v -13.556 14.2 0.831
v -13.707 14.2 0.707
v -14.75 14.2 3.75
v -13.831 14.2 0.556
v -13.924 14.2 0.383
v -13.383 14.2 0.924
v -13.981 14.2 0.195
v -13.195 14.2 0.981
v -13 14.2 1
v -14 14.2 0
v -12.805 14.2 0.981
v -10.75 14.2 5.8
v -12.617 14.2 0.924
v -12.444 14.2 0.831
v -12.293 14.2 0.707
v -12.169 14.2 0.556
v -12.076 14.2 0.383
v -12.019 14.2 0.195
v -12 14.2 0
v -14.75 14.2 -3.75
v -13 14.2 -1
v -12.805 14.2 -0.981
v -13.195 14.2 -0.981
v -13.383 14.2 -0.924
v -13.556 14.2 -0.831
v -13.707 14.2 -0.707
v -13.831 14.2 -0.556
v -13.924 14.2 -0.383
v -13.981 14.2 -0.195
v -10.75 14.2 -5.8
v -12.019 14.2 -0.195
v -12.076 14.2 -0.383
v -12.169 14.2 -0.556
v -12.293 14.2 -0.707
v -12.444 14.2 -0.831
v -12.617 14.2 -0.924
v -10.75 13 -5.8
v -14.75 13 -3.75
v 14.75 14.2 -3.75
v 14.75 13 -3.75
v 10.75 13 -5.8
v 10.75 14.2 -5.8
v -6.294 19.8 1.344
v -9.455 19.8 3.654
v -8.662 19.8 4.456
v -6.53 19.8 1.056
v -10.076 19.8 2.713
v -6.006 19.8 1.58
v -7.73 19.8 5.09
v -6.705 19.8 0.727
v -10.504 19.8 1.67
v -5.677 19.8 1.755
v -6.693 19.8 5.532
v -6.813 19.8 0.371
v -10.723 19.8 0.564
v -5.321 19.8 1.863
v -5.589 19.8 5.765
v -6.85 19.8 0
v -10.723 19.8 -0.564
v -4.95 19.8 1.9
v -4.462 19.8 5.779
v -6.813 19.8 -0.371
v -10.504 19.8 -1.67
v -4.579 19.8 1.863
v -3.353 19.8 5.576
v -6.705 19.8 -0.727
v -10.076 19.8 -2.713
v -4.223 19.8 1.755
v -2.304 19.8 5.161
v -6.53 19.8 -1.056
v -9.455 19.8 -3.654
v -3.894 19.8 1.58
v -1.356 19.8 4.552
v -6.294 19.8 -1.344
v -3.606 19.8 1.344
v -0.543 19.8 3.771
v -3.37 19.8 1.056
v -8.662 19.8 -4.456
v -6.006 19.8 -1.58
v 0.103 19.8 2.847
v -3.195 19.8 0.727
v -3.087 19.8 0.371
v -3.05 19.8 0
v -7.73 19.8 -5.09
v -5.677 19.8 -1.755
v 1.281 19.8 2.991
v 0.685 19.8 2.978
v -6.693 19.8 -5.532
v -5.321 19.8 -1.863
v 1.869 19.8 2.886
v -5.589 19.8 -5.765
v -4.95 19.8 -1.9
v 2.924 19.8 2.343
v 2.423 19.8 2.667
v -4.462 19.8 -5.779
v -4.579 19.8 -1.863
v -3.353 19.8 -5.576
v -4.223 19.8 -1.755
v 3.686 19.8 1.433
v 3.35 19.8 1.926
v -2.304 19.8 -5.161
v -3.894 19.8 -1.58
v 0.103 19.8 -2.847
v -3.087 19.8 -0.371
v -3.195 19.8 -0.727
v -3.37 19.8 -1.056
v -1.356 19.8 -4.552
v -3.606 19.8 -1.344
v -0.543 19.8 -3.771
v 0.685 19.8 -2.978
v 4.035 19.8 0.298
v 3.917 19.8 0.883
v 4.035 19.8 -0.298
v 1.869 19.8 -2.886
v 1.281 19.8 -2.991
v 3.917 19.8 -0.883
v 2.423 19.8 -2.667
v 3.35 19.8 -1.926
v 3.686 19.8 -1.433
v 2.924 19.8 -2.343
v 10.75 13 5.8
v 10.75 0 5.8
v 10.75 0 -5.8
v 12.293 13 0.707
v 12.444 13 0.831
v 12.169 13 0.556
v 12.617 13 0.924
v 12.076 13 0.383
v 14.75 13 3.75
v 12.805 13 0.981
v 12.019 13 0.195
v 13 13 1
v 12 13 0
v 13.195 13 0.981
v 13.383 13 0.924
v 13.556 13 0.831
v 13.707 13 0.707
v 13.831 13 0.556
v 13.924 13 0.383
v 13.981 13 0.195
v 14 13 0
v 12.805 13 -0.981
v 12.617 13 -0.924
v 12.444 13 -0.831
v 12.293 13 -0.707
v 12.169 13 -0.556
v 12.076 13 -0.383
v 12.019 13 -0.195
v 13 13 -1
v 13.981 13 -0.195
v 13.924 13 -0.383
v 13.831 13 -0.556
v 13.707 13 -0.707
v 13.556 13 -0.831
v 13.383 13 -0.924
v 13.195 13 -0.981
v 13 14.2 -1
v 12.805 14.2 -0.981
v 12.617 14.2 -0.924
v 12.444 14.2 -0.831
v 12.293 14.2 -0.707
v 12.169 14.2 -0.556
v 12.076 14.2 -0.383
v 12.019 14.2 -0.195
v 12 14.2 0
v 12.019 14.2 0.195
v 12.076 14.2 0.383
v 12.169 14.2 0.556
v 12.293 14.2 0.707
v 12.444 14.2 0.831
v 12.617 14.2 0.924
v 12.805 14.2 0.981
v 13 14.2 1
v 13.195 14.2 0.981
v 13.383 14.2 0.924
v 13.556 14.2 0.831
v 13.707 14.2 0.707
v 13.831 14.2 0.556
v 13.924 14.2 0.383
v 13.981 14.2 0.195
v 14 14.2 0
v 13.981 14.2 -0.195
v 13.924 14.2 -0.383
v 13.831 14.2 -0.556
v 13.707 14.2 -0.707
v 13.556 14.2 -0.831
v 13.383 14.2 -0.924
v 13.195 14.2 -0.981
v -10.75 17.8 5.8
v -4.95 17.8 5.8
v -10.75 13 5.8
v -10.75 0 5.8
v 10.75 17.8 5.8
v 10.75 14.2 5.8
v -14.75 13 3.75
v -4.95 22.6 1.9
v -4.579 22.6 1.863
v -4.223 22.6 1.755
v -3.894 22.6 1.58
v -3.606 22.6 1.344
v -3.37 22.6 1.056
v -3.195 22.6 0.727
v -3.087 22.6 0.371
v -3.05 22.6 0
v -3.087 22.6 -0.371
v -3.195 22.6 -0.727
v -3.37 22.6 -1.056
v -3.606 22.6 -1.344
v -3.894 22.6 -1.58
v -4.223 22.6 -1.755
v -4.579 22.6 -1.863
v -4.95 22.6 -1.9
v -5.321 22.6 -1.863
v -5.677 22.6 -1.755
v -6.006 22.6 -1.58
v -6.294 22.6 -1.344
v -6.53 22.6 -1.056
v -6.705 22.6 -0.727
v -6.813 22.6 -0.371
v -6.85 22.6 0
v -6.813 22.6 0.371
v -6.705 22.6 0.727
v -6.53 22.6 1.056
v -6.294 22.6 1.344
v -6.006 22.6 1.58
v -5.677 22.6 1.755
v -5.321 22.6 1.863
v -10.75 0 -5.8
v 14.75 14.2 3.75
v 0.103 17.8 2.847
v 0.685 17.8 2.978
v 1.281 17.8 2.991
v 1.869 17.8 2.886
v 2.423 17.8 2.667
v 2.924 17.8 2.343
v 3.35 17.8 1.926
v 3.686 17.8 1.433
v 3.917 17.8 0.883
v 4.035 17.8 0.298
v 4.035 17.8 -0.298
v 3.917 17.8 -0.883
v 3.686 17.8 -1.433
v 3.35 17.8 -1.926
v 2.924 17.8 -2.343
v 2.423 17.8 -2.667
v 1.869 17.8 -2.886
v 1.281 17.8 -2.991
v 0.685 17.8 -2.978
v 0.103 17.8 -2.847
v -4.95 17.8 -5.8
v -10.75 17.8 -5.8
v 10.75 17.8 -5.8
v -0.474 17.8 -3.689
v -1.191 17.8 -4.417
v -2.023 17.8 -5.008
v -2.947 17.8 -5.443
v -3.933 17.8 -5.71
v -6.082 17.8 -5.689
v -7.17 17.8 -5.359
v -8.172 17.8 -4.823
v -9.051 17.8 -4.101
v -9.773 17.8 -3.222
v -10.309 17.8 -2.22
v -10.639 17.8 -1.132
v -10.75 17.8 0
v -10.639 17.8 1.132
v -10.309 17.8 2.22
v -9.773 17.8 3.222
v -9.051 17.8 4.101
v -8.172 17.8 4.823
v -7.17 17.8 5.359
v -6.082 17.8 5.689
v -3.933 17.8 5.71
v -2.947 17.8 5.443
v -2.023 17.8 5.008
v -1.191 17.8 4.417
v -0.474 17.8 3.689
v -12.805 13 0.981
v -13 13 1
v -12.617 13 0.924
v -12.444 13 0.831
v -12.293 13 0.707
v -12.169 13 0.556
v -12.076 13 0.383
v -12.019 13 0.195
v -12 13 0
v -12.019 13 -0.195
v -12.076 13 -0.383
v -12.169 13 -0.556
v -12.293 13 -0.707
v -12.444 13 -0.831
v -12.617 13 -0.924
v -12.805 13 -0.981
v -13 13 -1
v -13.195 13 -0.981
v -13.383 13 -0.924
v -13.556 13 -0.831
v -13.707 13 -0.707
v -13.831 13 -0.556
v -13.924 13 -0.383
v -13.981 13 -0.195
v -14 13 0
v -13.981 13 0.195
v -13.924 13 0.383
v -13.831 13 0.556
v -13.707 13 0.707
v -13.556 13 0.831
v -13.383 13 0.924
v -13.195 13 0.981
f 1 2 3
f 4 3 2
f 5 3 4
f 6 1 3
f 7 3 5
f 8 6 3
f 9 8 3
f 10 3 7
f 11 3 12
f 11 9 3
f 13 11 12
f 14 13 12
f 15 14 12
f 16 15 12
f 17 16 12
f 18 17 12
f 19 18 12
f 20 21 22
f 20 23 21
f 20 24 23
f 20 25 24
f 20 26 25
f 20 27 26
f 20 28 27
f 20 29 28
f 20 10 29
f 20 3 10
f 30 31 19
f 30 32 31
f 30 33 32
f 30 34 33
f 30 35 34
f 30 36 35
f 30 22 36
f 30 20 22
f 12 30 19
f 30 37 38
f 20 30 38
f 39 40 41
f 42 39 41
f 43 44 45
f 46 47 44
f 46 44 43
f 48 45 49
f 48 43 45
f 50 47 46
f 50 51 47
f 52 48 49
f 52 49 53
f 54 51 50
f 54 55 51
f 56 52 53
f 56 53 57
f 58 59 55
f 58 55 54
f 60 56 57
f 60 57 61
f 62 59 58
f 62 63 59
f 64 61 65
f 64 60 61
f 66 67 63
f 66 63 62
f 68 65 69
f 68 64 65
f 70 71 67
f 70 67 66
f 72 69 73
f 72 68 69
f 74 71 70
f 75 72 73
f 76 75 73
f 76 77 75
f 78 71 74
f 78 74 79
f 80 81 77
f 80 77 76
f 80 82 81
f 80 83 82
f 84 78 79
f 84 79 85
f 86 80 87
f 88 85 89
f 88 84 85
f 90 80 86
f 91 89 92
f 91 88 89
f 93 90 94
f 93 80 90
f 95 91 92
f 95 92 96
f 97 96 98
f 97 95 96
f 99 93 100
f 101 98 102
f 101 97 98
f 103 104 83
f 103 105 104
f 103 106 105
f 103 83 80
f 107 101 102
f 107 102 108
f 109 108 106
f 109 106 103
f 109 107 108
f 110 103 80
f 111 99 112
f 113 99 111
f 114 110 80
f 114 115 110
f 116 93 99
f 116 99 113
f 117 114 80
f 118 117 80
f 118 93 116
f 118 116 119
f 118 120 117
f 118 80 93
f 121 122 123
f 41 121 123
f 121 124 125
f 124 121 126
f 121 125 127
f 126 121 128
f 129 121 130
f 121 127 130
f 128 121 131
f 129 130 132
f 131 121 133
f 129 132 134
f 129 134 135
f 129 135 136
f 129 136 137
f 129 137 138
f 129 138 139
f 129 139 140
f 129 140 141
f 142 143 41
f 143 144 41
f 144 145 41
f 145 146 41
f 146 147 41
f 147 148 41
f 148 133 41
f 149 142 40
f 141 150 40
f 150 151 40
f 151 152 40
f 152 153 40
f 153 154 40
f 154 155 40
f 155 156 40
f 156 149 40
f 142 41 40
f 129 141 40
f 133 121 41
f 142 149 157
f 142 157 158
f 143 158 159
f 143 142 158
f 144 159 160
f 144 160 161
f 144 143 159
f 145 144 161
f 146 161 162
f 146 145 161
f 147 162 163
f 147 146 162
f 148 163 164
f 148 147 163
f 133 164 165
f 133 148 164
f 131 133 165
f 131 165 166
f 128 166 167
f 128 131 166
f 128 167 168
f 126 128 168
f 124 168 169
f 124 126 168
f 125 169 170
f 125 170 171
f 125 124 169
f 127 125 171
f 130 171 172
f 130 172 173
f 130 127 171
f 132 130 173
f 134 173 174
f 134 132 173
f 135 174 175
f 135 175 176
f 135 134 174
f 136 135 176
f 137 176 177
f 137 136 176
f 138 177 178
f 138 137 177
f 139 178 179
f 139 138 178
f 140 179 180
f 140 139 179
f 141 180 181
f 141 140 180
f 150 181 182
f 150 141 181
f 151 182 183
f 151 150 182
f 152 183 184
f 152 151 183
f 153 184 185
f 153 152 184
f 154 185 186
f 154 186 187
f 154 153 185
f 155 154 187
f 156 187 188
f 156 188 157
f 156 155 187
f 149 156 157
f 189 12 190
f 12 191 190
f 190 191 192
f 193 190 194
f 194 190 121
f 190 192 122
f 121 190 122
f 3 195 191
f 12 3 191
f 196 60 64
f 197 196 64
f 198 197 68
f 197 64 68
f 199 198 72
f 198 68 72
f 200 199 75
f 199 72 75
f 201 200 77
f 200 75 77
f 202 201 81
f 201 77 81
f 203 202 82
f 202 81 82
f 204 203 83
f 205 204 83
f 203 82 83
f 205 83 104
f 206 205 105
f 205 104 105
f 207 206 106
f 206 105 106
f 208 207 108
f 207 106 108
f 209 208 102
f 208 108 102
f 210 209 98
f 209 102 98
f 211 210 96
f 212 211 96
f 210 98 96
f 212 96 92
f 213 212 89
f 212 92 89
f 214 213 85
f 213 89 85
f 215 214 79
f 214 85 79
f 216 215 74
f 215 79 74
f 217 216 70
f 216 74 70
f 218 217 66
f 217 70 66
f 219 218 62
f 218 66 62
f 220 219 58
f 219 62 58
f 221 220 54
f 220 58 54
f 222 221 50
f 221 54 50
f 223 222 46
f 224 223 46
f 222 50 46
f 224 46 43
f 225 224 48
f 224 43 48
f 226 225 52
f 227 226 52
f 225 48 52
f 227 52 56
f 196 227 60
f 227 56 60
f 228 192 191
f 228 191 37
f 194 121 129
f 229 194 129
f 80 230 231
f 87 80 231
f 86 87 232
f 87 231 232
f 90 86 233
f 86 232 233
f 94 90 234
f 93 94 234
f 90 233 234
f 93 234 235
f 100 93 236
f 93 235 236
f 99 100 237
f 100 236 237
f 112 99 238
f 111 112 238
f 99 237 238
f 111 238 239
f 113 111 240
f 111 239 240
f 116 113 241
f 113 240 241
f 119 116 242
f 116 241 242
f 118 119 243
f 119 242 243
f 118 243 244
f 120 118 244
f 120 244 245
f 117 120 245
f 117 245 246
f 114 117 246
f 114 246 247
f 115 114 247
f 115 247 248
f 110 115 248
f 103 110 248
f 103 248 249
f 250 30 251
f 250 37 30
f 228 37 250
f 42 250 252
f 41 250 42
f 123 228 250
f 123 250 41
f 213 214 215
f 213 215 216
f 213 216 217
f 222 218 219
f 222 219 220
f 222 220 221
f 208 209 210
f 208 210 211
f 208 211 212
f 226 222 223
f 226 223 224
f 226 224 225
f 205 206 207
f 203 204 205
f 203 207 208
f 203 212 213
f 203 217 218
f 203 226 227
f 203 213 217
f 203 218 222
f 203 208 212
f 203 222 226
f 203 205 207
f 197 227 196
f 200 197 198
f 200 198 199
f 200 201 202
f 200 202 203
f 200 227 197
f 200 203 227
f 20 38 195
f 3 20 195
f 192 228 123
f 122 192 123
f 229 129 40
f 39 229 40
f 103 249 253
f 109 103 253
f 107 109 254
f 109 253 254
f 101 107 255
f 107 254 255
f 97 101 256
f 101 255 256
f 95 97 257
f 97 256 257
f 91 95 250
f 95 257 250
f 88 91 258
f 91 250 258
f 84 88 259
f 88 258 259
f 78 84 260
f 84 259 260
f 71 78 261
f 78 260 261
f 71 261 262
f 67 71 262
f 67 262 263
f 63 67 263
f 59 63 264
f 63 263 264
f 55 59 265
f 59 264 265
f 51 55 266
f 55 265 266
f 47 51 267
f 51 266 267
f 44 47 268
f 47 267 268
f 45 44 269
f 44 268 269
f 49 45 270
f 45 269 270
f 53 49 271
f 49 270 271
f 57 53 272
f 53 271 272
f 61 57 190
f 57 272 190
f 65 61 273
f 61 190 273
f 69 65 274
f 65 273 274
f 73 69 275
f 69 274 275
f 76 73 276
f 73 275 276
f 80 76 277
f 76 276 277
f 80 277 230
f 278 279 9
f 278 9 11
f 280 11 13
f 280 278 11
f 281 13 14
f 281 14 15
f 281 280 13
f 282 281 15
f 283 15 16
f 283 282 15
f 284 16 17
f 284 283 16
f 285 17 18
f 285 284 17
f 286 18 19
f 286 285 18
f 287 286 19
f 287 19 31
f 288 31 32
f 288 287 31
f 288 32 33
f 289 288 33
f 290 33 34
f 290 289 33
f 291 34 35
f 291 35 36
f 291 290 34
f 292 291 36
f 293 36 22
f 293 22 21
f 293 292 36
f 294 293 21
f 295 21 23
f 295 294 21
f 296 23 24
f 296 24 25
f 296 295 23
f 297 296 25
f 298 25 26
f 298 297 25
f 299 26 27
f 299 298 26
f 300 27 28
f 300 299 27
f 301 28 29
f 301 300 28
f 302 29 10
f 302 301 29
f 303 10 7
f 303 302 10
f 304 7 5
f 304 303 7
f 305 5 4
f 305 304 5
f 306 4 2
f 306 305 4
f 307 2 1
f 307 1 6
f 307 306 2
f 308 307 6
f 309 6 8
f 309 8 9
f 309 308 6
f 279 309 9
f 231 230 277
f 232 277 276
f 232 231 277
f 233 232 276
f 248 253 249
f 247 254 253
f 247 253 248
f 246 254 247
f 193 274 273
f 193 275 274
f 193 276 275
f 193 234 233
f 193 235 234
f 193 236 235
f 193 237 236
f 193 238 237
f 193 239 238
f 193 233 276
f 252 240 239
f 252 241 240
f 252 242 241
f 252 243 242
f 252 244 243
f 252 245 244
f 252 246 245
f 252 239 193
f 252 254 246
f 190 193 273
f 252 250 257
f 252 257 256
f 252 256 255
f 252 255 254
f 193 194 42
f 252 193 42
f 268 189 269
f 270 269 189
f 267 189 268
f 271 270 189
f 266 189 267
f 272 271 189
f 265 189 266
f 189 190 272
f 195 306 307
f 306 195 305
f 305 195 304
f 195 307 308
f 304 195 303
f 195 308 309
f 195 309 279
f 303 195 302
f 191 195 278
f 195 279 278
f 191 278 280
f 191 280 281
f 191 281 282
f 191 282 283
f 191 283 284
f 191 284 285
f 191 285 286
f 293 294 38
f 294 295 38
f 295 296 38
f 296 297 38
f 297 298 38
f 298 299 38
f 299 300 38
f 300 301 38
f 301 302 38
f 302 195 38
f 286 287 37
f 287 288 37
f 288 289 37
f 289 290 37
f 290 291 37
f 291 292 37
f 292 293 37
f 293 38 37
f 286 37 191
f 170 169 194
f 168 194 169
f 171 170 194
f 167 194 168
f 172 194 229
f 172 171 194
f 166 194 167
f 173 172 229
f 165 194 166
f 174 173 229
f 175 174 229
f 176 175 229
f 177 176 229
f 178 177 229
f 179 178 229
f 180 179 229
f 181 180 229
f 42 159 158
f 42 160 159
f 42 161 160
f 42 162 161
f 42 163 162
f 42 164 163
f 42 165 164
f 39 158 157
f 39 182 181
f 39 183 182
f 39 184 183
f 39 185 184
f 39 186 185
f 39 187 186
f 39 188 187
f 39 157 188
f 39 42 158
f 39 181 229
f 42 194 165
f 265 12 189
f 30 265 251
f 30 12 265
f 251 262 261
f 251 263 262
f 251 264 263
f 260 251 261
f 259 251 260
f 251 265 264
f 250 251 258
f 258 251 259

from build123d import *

# Parameters (mm, degrees)
SKETCH1_W           = 21.5
SKETCH1_H           = 11.6
BOSS_EXTRUDE1_DEPTH = 13
SKETCH2_R           = 1
BOSS_EXTRUDE2_DEPTH = 1.2
SKETCH3_W           = 21.5
SKETCH3_H           = 11.6
BOSS_EXTRUDE3_DEPTH = 3.6
BOSS_EXTRUDE4_DEPTH = 2
SKETCH5_R           = 1.9
BOSS_EXTRUDE5_DEPTH = 2.8


with BuildPart() as part:
    # Sketch1 → Boss-Extrude1 (new body)
    with BuildSketch(Plane(origin=(0, 0, 0), x_dir=(1, 0, 0), z_dir=(0, 1, 0))):
        Rectangle(SKETCH1_W, SKETCH1_H)
    extrude(amount=BOSS_EXTRUDE1_DEPTH)

    # Sketch2 → Boss-Extrude2 (add)
    with BuildSketch(Plane(origin=(0, 13, 0), x_dir=(1, 0, 0), z_dir=(0, 1, 0))):
        Polygon((-10.75, 5.8), (-14.75, 3.75), (-14.75, -3.75), (-10.75, -5.8), (10.75, -5.8), (14.75, -3.75), (14.75, 3.75), (10.75, 5.8), align=None)
        with Locations(Location((-13, 0, 0), (0, 0, 270))):
            Circle(SKETCH2_R, mode=Mode.SUBTRACT)
        with Locations(Location((13, 0, 0), (0, 0, 90))):
            Circle(SKETCH2_R, mode=Mode.SUBTRACT)
    extrude(amount=BOSS_EXTRUDE2_DEPTH)

    # Sketch3 → Boss-Extrude3 (add)
    with BuildSketch(Plane(origin=(0, 14.2, 0), x_dir=(1, 0, 0), z_dir=(0, 1, 0))):
        Rectangle(SKETCH3_W, SKETCH3_H)
    extrude(amount=BOSS_EXTRUDE3_DEPTH)

    # Sketch4 → Boss-Extrude4 (add)
    with BuildSketch(Plane(origin=(0, 17.8, 0), x_dir=(1, 0, 0), z_dir=(0, 1, 0))):
        with BuildLine():
            ThreePointArc((0.103333333, 2.846721311), (-10.75, 0), (0.103333333, -2.846721311))
            ThreePointArc((0.103333333, -2.846721311), (4.05, 0), (0.103333333, 2.846721311))
        make_face()
    extrude(amount=BOSS_EXTRUDE4_DEPTH)

    # Sketch5 → Boss-Extrude5 (add)
    with BuildSketch(Plane(origin=(0, 19.8, 0), x_dir=(1, 0, 0), z_dir=(0, 1, 0))):
        with Locations(Location((-4.95, 0, 0), (0, 0, 270))):
            Circle(SKETCH5_R)
    extrude(amount=BOSS_EXTRUDE5_DEPTH)


solid = part.part
